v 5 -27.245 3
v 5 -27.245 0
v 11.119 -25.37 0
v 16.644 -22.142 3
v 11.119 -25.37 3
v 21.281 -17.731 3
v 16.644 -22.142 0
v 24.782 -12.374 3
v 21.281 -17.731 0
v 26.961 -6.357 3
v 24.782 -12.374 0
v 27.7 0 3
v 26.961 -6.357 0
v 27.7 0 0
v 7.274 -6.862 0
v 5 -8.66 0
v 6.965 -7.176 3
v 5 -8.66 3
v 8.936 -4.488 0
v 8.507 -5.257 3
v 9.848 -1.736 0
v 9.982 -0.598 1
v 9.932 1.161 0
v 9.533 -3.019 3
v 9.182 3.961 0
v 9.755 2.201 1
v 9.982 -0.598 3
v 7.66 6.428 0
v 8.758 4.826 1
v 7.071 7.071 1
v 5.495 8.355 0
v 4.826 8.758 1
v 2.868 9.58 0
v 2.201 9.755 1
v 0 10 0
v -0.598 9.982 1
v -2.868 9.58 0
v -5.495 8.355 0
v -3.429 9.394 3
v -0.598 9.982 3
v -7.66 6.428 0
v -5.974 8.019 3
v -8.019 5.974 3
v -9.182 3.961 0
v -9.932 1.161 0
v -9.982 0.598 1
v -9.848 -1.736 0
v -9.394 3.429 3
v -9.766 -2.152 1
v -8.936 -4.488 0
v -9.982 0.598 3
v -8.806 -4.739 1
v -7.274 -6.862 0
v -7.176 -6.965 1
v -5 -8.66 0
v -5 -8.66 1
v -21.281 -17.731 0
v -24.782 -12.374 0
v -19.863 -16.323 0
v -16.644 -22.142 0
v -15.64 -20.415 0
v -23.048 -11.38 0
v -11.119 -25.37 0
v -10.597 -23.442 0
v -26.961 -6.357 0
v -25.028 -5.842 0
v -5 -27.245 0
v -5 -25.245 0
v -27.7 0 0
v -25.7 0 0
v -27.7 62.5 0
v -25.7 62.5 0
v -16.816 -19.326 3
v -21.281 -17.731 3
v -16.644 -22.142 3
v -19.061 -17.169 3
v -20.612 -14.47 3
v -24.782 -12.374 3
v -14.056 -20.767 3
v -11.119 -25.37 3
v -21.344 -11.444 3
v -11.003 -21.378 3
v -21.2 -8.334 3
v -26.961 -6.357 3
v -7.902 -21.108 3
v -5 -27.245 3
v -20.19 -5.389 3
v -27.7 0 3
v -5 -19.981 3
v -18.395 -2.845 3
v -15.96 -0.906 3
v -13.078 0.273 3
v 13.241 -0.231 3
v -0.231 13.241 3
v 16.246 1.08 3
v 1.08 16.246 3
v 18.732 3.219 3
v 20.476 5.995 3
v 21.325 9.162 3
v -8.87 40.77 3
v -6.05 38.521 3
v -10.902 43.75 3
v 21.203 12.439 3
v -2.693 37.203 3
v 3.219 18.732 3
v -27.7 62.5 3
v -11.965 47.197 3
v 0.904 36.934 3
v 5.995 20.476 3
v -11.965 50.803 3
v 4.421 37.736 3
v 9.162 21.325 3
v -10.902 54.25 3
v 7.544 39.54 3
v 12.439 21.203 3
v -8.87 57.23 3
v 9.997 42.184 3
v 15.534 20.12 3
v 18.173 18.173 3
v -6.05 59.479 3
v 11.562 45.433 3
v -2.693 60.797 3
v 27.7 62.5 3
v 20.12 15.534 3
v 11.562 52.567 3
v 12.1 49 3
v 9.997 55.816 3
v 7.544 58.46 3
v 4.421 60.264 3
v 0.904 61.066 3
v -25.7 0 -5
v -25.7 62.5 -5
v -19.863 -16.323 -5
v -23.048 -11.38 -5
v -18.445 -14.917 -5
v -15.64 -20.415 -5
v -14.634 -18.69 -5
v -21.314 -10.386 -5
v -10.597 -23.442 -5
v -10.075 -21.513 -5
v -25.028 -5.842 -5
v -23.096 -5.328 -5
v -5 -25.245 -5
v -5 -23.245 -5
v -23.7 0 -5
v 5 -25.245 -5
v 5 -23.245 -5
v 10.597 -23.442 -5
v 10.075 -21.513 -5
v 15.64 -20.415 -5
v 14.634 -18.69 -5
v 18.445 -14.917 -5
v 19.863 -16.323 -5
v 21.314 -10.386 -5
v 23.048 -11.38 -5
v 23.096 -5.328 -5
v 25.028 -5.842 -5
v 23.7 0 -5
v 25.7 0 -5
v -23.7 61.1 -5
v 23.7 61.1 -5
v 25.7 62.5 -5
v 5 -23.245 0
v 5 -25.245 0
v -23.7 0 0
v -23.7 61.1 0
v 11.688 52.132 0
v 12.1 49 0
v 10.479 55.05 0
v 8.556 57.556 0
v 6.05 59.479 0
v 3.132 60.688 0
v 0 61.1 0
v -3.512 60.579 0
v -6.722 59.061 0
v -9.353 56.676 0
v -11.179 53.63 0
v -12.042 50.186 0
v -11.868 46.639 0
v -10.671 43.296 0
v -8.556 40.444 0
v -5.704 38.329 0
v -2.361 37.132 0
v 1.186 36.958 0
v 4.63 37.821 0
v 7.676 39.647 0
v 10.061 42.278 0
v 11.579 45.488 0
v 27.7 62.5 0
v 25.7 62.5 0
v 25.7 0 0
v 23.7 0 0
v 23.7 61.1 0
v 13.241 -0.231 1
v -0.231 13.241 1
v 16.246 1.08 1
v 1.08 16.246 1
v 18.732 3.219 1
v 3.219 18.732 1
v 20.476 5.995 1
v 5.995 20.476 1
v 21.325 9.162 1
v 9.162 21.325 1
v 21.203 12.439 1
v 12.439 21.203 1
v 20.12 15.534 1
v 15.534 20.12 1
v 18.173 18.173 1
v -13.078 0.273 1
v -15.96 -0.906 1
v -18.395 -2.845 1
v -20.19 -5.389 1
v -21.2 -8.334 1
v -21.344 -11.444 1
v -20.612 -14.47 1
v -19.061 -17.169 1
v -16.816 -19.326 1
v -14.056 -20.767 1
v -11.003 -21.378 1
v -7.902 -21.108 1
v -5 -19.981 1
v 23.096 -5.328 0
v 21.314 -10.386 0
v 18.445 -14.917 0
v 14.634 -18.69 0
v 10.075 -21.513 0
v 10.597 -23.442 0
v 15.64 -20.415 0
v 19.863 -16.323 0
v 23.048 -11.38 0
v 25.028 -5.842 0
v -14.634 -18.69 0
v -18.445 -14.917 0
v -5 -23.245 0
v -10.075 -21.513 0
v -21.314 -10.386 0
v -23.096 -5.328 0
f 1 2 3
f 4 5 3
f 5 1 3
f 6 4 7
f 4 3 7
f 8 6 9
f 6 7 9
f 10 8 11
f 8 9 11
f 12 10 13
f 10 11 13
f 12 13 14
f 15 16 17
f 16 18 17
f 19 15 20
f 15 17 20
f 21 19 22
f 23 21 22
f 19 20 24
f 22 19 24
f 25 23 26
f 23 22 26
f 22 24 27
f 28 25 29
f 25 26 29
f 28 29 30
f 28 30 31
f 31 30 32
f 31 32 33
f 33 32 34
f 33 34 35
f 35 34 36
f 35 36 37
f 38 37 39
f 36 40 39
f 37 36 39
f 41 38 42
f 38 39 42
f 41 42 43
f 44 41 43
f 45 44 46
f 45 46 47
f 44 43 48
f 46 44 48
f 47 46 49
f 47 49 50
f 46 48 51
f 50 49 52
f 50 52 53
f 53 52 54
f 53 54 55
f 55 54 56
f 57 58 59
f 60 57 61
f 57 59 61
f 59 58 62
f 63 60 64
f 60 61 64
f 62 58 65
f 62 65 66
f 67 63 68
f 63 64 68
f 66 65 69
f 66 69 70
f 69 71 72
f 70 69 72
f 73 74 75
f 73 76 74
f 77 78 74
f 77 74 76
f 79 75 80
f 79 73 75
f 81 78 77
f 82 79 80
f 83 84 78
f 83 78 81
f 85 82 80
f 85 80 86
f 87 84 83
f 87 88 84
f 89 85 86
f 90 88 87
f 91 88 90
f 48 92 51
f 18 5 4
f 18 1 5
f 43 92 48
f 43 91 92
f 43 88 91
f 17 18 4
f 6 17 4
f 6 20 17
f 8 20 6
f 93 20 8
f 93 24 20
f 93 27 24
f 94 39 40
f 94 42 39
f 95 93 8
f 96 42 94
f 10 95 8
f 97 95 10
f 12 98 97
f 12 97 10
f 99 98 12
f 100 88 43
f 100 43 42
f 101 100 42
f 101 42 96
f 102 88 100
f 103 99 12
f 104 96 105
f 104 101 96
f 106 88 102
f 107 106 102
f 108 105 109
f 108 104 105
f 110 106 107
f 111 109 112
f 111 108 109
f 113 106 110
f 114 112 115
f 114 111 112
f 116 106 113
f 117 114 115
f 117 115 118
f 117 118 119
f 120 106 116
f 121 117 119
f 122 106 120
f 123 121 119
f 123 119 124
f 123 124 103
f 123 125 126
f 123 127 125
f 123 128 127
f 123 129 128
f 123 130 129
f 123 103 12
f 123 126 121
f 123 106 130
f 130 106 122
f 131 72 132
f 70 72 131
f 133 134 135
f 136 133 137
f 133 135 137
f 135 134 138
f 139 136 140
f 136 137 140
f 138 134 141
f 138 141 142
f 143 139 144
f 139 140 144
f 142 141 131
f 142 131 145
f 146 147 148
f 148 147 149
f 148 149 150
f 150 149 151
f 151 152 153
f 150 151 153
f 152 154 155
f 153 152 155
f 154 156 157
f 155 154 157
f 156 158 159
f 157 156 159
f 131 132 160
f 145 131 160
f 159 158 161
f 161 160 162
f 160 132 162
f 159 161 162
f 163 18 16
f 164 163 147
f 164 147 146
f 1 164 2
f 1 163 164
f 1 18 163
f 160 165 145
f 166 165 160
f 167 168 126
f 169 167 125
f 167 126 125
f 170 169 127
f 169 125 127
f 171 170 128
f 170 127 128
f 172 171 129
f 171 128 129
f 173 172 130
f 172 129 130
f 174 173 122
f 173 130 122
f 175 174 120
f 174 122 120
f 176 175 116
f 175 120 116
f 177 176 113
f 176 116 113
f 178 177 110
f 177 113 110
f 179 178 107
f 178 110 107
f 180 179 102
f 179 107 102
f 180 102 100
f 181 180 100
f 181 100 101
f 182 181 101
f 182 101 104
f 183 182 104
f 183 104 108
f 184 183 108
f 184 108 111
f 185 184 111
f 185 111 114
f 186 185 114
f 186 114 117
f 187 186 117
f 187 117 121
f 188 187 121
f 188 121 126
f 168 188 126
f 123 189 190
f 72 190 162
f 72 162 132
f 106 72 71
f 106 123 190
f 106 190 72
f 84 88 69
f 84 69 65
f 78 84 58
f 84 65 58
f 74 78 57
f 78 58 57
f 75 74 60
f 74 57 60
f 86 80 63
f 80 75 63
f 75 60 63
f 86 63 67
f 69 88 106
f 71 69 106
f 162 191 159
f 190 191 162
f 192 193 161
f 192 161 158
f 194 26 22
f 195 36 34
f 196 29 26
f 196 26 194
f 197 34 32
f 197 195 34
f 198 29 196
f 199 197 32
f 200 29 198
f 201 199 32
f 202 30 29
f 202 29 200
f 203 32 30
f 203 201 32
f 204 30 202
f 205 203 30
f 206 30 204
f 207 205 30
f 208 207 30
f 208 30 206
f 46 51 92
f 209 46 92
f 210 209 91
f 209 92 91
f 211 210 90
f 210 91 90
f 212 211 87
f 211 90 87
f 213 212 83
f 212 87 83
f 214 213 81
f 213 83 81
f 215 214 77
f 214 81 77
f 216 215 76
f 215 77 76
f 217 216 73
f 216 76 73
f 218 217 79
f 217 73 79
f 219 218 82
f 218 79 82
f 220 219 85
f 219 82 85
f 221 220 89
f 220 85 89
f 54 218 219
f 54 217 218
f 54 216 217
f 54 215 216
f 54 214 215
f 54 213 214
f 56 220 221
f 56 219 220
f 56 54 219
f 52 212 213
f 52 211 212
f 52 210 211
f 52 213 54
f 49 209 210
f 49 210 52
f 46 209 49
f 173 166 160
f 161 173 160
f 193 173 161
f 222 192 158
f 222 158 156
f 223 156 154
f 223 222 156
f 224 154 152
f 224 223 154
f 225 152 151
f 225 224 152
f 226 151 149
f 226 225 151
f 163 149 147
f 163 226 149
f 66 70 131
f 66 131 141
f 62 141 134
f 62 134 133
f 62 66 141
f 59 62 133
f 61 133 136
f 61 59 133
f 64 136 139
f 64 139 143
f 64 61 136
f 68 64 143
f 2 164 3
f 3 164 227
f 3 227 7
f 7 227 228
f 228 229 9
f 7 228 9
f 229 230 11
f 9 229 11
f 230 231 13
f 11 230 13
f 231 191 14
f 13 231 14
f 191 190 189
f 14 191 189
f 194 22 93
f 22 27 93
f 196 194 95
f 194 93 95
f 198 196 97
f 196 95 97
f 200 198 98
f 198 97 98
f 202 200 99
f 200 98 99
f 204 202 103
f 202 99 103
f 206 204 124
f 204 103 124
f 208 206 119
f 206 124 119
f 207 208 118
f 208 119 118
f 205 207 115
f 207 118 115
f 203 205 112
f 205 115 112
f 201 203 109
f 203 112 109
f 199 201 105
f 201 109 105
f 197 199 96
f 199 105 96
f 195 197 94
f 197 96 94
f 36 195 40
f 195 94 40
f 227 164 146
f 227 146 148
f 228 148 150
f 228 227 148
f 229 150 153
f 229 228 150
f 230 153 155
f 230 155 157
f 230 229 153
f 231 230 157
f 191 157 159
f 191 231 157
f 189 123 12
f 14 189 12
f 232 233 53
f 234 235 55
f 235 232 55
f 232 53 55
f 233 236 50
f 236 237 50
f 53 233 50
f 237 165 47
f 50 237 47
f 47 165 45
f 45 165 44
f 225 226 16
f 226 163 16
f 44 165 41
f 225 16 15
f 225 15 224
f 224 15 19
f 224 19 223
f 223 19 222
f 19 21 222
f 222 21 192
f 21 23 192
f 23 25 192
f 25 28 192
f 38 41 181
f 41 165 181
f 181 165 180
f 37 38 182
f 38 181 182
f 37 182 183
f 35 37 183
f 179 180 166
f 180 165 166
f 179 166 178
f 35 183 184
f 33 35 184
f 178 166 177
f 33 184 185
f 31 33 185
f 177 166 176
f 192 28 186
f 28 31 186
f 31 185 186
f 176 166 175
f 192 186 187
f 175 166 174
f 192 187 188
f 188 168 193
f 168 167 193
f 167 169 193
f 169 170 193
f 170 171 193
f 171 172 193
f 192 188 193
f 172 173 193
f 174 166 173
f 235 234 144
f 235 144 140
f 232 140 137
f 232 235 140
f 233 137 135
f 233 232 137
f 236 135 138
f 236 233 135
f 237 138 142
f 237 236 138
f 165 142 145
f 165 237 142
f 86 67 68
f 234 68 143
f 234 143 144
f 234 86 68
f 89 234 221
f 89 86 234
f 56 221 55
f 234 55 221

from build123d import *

# Parameters (mm, degrees)
SKETCH1_R           = 27.7
BOSS_EXTRUDE1_DEPTH = 3
SKETCH2_R           = 11
CUT_EXTRUDE1_DEPTH  = 2
SKETCH4_R           = 10
CUT_EXTRUDE2_DEPTH  = 3
SKETCH5_R           = 12.1
BOSS_EXTRUDE3_DEPTH = 3
SKETCH6_W           = 10
SKETCH6_H           = 27.7
CUT_EXTRUDE3_DEPTH  = 3
BOSS_EXTRUDE4_DEPTH = 5


with BuildPart() as part:
    # Sketch1 → Boss-Extrude1 (new body)
    with BuildSketch(Plane.XY):
        Circle(SKETCH1_R)
    extrude(amount=BOSS_EXTRUDE1_DEPTH)

    # Sketch2 → Cut-Extrude1 (cut)
    with BuildSketch(Plane.XY.offset(3)):
        with Locations((-10.394469683, -10.394469683)):
            Circle(SKETCH2_R)
        with Locations((10.394469683, 10.394469683)):
            Circle(SKETCH2_R)
    extrude(amount=-CUT_EXTRUDE1_DEPTH, mode=Mode.SUBTRACT)

    # Sketch4 → Cut-Extrude2 (cut)
    with BuildSketch(Plane.XY.offset(3)):
        Circle(SKETCH4_R)
    extrude(amount=-CUT_EXTRUDE2_DEPTH, mode=Mode.SUBTRACT)

    # Sketch6 → Cut-Extrude3 (cut)
    with BuildSketch(Plane.XY.offset(3)):
        with Locations((0, -13.85)):
            Rectangle(SKETCH6_W, SKETCH6_H)
    extrude(amount=-CUT_EXTRUDE3_DEPTH, mode=Mode.SUBTRACT)



with BuildPart() as body_2:
    # Sketch5 → Boss-Extrude3 (new body)
    with BuildSketch(Plane.XY.offset(3)):
        with BuildLine():
            Line((-27.7, 0), (-27.7, 62.5))
            Line((-27.7, 62.5), (27.7, 62.5))
            Line((27.7, 62.5), (27.7, 0))
            ThreePointArc((27.7, 0), (0, 27.7), (-27.7, 0))
        make_face()
        with Locations((0, 49)):
            Circle(SKETCH5_R, mode=Mode.SUBTRACT)
    extrude(amount=-BOSS_EXTRUDE3_DEPTH)


with BuildPart() as part_1:
    add(part.part)

    add(body_2.part)  # Boss-Extrude4 merges body 2
    # Sketch8 → Boss-Extrude4 (add)
    with BuildSketch(Plane(origin=(0, 0, 0), x_dir=(-1, 0, 0), z_dir=(0, 0, -1))):
        with BuildLine():
            Line((-23.7, 62.5), (23.7, 62.5))
            Line((23.7, 62.5), (25.7, 62.5))
            Line((25.7, 62.5), (25.7, 0))
            ThreePointArc((25.7, 0), (19.863362581, -16.32329625), (5, -25.244999541))
            Line((5, -25.244999541), (5, -23.244999541))
            ThreePointArc((5, -23.244999541), (18.444726934, -14.91660152), (23.7, 0))
            Line((23.7, 0), (23.7, 61.1))
            Line((23.7, 61.1), (-23.7, 61.1))
            Line((-23.7, 61.1), (-23.7, 0))
            ThreePointArc((-23.7, 0), (-18.444726934, -14.91660152), (-5, -23.244999541))
            Line((-5, -23.244999541), (-5, -25.244999541))
            ThreePointArc((-5, -25.244999541), (-19.863362581, -16.32329625), (-25.7, 0))
            Line((-25.7, 0), (-25.7, 62.5))
            Line((-25.7, 62.5), (-23.7, 62.5))
        make_face()
    extrude(amount=BOSS_EXTRUDE4_DEPTH)


solid = part_1.part
